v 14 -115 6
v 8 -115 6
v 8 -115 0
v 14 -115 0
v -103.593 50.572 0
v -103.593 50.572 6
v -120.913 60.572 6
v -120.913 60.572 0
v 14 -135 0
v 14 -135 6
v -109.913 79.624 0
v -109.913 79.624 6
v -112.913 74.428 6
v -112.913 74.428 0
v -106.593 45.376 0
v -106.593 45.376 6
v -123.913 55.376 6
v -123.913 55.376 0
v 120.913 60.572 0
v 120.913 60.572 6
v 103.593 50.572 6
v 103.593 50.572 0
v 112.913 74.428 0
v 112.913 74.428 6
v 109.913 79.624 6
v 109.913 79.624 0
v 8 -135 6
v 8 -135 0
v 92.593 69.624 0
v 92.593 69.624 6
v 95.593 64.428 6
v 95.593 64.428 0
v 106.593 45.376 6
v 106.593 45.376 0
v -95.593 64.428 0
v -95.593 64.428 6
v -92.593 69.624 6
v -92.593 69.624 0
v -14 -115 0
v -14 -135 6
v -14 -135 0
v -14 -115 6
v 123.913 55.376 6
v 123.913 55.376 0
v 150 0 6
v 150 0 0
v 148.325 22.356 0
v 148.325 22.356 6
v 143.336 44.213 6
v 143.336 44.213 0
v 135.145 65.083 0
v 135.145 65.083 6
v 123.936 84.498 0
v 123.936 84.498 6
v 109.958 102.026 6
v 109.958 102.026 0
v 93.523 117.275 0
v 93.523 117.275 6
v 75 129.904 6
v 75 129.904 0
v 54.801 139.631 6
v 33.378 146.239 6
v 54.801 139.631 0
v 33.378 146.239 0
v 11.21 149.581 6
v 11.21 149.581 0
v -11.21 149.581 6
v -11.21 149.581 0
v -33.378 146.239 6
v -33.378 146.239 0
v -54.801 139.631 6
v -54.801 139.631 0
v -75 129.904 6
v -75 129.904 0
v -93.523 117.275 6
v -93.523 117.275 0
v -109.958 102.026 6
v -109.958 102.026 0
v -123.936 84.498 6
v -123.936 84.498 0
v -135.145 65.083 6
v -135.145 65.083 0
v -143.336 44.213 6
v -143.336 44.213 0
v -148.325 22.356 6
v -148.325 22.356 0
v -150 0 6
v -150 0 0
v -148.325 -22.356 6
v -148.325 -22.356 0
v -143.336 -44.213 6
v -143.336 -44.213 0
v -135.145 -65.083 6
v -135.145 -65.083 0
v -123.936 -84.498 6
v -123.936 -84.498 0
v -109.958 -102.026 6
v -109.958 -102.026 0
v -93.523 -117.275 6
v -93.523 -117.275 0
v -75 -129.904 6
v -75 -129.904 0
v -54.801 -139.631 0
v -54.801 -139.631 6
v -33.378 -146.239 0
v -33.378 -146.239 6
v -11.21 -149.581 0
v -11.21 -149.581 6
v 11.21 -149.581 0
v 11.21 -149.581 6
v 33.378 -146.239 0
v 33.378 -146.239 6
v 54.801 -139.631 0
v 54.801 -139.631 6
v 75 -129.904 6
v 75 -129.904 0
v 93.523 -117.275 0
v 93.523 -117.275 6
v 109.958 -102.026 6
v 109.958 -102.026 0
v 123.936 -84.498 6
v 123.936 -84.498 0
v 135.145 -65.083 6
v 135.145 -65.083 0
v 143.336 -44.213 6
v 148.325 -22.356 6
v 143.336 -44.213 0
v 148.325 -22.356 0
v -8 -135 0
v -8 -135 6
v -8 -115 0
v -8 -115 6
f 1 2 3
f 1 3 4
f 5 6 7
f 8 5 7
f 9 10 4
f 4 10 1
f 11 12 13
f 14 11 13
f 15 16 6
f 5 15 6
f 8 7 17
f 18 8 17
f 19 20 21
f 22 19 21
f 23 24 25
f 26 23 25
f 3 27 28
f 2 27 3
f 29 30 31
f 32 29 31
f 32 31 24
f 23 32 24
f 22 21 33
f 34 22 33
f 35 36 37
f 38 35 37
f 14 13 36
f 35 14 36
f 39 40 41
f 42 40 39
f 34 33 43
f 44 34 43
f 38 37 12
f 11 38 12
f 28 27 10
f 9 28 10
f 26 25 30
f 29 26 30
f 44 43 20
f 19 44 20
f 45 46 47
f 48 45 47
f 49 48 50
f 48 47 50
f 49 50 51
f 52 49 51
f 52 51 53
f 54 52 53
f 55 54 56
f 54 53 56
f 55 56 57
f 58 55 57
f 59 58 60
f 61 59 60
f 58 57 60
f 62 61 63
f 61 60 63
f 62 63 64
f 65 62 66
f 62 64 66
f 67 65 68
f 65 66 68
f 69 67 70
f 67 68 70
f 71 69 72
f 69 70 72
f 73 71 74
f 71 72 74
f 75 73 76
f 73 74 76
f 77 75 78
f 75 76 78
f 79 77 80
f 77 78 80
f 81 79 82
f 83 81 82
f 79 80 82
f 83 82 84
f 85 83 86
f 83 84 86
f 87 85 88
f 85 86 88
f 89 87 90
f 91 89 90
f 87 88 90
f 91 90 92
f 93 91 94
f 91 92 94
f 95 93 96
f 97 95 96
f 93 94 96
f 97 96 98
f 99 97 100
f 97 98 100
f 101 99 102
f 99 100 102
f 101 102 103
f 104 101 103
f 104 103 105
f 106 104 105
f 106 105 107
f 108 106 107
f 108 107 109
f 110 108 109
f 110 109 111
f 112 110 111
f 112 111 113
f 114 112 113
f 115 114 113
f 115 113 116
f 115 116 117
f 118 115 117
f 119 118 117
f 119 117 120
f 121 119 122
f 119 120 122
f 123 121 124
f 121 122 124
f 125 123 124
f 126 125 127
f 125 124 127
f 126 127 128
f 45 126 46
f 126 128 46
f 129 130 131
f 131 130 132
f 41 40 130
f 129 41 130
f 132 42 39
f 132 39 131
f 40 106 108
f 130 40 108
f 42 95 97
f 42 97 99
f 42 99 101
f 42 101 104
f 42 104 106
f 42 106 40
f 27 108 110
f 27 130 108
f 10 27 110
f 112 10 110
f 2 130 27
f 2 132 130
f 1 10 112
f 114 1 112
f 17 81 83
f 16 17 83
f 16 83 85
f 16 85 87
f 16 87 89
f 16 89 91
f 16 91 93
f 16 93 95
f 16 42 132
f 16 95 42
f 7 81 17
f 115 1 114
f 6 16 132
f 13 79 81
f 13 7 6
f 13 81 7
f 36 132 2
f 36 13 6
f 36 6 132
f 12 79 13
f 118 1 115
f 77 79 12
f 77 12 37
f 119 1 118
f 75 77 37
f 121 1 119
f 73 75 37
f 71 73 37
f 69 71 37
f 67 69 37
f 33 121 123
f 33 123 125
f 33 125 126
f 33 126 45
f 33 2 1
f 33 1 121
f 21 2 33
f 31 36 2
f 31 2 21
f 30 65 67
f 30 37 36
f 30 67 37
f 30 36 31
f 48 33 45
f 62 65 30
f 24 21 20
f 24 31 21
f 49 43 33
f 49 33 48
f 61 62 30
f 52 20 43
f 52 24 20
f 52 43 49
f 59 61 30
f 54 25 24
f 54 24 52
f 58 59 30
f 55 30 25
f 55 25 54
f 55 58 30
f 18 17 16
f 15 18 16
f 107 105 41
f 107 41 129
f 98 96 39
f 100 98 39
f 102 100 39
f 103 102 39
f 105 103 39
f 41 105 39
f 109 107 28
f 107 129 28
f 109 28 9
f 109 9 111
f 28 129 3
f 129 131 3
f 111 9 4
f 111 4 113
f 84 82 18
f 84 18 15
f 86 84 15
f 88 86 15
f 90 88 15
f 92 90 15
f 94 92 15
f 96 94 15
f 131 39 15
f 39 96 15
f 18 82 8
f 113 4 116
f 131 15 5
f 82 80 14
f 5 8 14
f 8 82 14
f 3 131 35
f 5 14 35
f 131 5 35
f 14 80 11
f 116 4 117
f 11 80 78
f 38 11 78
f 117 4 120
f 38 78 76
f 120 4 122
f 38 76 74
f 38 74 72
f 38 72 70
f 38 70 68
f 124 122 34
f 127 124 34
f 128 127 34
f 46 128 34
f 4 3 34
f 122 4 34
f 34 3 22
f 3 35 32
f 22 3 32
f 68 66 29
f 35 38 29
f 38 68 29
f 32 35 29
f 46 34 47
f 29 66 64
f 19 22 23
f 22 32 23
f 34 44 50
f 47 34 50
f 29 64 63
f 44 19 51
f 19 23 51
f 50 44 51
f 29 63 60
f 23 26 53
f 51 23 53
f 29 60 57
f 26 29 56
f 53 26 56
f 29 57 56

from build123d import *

# Parameters (mm, degrees)
F0_R     = 150
F1_DEPTH = 6
F2_W     = 6
F2_H     = 20
F3_DEPTH = 6.001


with BuildPart() as f1:
    # F0 (on Top) → F1 (new body)
    with BuildSketch(Plane.XY):
        Circle(F0_R)
    extrude(amount=F1_DEPTH)

    # F2 (on face) → F3 (cut, through all)
    with BuildSketch(Plane.XY.offset(6)):
        with Locations((-11, -125)):
            Rectangle(F2_W, F2_H)
        with Locations((11, -125)):
            Rectangle(F2_W, F2_H)
        Polygon((103.592921, 50.571797), (106.592921, 45.375644), (123.91343, 55.375644), (120.91343, 60.571797), align=None)
        Polygon((92.592921, 69.624356), (95.592921, 64.428203), (112.91343, 74.428203), (109.91343, 79.624356), align=None)
        Polygon((-95.592921, 64.428203), (-92.592921, 69.624356), (-109.91343, 79.624356), (-112.91343, 74.428203), align=None)
        Polygon((-106.592921, 45.375644), (-103.592921, 50.571797), (-120.91343, 60.571797), (-123.91343, 55.375644), align=None)
    extrude(amount=-F3_DEPTH, mode=Mode.SUBTRACT)


solid = f1.part
